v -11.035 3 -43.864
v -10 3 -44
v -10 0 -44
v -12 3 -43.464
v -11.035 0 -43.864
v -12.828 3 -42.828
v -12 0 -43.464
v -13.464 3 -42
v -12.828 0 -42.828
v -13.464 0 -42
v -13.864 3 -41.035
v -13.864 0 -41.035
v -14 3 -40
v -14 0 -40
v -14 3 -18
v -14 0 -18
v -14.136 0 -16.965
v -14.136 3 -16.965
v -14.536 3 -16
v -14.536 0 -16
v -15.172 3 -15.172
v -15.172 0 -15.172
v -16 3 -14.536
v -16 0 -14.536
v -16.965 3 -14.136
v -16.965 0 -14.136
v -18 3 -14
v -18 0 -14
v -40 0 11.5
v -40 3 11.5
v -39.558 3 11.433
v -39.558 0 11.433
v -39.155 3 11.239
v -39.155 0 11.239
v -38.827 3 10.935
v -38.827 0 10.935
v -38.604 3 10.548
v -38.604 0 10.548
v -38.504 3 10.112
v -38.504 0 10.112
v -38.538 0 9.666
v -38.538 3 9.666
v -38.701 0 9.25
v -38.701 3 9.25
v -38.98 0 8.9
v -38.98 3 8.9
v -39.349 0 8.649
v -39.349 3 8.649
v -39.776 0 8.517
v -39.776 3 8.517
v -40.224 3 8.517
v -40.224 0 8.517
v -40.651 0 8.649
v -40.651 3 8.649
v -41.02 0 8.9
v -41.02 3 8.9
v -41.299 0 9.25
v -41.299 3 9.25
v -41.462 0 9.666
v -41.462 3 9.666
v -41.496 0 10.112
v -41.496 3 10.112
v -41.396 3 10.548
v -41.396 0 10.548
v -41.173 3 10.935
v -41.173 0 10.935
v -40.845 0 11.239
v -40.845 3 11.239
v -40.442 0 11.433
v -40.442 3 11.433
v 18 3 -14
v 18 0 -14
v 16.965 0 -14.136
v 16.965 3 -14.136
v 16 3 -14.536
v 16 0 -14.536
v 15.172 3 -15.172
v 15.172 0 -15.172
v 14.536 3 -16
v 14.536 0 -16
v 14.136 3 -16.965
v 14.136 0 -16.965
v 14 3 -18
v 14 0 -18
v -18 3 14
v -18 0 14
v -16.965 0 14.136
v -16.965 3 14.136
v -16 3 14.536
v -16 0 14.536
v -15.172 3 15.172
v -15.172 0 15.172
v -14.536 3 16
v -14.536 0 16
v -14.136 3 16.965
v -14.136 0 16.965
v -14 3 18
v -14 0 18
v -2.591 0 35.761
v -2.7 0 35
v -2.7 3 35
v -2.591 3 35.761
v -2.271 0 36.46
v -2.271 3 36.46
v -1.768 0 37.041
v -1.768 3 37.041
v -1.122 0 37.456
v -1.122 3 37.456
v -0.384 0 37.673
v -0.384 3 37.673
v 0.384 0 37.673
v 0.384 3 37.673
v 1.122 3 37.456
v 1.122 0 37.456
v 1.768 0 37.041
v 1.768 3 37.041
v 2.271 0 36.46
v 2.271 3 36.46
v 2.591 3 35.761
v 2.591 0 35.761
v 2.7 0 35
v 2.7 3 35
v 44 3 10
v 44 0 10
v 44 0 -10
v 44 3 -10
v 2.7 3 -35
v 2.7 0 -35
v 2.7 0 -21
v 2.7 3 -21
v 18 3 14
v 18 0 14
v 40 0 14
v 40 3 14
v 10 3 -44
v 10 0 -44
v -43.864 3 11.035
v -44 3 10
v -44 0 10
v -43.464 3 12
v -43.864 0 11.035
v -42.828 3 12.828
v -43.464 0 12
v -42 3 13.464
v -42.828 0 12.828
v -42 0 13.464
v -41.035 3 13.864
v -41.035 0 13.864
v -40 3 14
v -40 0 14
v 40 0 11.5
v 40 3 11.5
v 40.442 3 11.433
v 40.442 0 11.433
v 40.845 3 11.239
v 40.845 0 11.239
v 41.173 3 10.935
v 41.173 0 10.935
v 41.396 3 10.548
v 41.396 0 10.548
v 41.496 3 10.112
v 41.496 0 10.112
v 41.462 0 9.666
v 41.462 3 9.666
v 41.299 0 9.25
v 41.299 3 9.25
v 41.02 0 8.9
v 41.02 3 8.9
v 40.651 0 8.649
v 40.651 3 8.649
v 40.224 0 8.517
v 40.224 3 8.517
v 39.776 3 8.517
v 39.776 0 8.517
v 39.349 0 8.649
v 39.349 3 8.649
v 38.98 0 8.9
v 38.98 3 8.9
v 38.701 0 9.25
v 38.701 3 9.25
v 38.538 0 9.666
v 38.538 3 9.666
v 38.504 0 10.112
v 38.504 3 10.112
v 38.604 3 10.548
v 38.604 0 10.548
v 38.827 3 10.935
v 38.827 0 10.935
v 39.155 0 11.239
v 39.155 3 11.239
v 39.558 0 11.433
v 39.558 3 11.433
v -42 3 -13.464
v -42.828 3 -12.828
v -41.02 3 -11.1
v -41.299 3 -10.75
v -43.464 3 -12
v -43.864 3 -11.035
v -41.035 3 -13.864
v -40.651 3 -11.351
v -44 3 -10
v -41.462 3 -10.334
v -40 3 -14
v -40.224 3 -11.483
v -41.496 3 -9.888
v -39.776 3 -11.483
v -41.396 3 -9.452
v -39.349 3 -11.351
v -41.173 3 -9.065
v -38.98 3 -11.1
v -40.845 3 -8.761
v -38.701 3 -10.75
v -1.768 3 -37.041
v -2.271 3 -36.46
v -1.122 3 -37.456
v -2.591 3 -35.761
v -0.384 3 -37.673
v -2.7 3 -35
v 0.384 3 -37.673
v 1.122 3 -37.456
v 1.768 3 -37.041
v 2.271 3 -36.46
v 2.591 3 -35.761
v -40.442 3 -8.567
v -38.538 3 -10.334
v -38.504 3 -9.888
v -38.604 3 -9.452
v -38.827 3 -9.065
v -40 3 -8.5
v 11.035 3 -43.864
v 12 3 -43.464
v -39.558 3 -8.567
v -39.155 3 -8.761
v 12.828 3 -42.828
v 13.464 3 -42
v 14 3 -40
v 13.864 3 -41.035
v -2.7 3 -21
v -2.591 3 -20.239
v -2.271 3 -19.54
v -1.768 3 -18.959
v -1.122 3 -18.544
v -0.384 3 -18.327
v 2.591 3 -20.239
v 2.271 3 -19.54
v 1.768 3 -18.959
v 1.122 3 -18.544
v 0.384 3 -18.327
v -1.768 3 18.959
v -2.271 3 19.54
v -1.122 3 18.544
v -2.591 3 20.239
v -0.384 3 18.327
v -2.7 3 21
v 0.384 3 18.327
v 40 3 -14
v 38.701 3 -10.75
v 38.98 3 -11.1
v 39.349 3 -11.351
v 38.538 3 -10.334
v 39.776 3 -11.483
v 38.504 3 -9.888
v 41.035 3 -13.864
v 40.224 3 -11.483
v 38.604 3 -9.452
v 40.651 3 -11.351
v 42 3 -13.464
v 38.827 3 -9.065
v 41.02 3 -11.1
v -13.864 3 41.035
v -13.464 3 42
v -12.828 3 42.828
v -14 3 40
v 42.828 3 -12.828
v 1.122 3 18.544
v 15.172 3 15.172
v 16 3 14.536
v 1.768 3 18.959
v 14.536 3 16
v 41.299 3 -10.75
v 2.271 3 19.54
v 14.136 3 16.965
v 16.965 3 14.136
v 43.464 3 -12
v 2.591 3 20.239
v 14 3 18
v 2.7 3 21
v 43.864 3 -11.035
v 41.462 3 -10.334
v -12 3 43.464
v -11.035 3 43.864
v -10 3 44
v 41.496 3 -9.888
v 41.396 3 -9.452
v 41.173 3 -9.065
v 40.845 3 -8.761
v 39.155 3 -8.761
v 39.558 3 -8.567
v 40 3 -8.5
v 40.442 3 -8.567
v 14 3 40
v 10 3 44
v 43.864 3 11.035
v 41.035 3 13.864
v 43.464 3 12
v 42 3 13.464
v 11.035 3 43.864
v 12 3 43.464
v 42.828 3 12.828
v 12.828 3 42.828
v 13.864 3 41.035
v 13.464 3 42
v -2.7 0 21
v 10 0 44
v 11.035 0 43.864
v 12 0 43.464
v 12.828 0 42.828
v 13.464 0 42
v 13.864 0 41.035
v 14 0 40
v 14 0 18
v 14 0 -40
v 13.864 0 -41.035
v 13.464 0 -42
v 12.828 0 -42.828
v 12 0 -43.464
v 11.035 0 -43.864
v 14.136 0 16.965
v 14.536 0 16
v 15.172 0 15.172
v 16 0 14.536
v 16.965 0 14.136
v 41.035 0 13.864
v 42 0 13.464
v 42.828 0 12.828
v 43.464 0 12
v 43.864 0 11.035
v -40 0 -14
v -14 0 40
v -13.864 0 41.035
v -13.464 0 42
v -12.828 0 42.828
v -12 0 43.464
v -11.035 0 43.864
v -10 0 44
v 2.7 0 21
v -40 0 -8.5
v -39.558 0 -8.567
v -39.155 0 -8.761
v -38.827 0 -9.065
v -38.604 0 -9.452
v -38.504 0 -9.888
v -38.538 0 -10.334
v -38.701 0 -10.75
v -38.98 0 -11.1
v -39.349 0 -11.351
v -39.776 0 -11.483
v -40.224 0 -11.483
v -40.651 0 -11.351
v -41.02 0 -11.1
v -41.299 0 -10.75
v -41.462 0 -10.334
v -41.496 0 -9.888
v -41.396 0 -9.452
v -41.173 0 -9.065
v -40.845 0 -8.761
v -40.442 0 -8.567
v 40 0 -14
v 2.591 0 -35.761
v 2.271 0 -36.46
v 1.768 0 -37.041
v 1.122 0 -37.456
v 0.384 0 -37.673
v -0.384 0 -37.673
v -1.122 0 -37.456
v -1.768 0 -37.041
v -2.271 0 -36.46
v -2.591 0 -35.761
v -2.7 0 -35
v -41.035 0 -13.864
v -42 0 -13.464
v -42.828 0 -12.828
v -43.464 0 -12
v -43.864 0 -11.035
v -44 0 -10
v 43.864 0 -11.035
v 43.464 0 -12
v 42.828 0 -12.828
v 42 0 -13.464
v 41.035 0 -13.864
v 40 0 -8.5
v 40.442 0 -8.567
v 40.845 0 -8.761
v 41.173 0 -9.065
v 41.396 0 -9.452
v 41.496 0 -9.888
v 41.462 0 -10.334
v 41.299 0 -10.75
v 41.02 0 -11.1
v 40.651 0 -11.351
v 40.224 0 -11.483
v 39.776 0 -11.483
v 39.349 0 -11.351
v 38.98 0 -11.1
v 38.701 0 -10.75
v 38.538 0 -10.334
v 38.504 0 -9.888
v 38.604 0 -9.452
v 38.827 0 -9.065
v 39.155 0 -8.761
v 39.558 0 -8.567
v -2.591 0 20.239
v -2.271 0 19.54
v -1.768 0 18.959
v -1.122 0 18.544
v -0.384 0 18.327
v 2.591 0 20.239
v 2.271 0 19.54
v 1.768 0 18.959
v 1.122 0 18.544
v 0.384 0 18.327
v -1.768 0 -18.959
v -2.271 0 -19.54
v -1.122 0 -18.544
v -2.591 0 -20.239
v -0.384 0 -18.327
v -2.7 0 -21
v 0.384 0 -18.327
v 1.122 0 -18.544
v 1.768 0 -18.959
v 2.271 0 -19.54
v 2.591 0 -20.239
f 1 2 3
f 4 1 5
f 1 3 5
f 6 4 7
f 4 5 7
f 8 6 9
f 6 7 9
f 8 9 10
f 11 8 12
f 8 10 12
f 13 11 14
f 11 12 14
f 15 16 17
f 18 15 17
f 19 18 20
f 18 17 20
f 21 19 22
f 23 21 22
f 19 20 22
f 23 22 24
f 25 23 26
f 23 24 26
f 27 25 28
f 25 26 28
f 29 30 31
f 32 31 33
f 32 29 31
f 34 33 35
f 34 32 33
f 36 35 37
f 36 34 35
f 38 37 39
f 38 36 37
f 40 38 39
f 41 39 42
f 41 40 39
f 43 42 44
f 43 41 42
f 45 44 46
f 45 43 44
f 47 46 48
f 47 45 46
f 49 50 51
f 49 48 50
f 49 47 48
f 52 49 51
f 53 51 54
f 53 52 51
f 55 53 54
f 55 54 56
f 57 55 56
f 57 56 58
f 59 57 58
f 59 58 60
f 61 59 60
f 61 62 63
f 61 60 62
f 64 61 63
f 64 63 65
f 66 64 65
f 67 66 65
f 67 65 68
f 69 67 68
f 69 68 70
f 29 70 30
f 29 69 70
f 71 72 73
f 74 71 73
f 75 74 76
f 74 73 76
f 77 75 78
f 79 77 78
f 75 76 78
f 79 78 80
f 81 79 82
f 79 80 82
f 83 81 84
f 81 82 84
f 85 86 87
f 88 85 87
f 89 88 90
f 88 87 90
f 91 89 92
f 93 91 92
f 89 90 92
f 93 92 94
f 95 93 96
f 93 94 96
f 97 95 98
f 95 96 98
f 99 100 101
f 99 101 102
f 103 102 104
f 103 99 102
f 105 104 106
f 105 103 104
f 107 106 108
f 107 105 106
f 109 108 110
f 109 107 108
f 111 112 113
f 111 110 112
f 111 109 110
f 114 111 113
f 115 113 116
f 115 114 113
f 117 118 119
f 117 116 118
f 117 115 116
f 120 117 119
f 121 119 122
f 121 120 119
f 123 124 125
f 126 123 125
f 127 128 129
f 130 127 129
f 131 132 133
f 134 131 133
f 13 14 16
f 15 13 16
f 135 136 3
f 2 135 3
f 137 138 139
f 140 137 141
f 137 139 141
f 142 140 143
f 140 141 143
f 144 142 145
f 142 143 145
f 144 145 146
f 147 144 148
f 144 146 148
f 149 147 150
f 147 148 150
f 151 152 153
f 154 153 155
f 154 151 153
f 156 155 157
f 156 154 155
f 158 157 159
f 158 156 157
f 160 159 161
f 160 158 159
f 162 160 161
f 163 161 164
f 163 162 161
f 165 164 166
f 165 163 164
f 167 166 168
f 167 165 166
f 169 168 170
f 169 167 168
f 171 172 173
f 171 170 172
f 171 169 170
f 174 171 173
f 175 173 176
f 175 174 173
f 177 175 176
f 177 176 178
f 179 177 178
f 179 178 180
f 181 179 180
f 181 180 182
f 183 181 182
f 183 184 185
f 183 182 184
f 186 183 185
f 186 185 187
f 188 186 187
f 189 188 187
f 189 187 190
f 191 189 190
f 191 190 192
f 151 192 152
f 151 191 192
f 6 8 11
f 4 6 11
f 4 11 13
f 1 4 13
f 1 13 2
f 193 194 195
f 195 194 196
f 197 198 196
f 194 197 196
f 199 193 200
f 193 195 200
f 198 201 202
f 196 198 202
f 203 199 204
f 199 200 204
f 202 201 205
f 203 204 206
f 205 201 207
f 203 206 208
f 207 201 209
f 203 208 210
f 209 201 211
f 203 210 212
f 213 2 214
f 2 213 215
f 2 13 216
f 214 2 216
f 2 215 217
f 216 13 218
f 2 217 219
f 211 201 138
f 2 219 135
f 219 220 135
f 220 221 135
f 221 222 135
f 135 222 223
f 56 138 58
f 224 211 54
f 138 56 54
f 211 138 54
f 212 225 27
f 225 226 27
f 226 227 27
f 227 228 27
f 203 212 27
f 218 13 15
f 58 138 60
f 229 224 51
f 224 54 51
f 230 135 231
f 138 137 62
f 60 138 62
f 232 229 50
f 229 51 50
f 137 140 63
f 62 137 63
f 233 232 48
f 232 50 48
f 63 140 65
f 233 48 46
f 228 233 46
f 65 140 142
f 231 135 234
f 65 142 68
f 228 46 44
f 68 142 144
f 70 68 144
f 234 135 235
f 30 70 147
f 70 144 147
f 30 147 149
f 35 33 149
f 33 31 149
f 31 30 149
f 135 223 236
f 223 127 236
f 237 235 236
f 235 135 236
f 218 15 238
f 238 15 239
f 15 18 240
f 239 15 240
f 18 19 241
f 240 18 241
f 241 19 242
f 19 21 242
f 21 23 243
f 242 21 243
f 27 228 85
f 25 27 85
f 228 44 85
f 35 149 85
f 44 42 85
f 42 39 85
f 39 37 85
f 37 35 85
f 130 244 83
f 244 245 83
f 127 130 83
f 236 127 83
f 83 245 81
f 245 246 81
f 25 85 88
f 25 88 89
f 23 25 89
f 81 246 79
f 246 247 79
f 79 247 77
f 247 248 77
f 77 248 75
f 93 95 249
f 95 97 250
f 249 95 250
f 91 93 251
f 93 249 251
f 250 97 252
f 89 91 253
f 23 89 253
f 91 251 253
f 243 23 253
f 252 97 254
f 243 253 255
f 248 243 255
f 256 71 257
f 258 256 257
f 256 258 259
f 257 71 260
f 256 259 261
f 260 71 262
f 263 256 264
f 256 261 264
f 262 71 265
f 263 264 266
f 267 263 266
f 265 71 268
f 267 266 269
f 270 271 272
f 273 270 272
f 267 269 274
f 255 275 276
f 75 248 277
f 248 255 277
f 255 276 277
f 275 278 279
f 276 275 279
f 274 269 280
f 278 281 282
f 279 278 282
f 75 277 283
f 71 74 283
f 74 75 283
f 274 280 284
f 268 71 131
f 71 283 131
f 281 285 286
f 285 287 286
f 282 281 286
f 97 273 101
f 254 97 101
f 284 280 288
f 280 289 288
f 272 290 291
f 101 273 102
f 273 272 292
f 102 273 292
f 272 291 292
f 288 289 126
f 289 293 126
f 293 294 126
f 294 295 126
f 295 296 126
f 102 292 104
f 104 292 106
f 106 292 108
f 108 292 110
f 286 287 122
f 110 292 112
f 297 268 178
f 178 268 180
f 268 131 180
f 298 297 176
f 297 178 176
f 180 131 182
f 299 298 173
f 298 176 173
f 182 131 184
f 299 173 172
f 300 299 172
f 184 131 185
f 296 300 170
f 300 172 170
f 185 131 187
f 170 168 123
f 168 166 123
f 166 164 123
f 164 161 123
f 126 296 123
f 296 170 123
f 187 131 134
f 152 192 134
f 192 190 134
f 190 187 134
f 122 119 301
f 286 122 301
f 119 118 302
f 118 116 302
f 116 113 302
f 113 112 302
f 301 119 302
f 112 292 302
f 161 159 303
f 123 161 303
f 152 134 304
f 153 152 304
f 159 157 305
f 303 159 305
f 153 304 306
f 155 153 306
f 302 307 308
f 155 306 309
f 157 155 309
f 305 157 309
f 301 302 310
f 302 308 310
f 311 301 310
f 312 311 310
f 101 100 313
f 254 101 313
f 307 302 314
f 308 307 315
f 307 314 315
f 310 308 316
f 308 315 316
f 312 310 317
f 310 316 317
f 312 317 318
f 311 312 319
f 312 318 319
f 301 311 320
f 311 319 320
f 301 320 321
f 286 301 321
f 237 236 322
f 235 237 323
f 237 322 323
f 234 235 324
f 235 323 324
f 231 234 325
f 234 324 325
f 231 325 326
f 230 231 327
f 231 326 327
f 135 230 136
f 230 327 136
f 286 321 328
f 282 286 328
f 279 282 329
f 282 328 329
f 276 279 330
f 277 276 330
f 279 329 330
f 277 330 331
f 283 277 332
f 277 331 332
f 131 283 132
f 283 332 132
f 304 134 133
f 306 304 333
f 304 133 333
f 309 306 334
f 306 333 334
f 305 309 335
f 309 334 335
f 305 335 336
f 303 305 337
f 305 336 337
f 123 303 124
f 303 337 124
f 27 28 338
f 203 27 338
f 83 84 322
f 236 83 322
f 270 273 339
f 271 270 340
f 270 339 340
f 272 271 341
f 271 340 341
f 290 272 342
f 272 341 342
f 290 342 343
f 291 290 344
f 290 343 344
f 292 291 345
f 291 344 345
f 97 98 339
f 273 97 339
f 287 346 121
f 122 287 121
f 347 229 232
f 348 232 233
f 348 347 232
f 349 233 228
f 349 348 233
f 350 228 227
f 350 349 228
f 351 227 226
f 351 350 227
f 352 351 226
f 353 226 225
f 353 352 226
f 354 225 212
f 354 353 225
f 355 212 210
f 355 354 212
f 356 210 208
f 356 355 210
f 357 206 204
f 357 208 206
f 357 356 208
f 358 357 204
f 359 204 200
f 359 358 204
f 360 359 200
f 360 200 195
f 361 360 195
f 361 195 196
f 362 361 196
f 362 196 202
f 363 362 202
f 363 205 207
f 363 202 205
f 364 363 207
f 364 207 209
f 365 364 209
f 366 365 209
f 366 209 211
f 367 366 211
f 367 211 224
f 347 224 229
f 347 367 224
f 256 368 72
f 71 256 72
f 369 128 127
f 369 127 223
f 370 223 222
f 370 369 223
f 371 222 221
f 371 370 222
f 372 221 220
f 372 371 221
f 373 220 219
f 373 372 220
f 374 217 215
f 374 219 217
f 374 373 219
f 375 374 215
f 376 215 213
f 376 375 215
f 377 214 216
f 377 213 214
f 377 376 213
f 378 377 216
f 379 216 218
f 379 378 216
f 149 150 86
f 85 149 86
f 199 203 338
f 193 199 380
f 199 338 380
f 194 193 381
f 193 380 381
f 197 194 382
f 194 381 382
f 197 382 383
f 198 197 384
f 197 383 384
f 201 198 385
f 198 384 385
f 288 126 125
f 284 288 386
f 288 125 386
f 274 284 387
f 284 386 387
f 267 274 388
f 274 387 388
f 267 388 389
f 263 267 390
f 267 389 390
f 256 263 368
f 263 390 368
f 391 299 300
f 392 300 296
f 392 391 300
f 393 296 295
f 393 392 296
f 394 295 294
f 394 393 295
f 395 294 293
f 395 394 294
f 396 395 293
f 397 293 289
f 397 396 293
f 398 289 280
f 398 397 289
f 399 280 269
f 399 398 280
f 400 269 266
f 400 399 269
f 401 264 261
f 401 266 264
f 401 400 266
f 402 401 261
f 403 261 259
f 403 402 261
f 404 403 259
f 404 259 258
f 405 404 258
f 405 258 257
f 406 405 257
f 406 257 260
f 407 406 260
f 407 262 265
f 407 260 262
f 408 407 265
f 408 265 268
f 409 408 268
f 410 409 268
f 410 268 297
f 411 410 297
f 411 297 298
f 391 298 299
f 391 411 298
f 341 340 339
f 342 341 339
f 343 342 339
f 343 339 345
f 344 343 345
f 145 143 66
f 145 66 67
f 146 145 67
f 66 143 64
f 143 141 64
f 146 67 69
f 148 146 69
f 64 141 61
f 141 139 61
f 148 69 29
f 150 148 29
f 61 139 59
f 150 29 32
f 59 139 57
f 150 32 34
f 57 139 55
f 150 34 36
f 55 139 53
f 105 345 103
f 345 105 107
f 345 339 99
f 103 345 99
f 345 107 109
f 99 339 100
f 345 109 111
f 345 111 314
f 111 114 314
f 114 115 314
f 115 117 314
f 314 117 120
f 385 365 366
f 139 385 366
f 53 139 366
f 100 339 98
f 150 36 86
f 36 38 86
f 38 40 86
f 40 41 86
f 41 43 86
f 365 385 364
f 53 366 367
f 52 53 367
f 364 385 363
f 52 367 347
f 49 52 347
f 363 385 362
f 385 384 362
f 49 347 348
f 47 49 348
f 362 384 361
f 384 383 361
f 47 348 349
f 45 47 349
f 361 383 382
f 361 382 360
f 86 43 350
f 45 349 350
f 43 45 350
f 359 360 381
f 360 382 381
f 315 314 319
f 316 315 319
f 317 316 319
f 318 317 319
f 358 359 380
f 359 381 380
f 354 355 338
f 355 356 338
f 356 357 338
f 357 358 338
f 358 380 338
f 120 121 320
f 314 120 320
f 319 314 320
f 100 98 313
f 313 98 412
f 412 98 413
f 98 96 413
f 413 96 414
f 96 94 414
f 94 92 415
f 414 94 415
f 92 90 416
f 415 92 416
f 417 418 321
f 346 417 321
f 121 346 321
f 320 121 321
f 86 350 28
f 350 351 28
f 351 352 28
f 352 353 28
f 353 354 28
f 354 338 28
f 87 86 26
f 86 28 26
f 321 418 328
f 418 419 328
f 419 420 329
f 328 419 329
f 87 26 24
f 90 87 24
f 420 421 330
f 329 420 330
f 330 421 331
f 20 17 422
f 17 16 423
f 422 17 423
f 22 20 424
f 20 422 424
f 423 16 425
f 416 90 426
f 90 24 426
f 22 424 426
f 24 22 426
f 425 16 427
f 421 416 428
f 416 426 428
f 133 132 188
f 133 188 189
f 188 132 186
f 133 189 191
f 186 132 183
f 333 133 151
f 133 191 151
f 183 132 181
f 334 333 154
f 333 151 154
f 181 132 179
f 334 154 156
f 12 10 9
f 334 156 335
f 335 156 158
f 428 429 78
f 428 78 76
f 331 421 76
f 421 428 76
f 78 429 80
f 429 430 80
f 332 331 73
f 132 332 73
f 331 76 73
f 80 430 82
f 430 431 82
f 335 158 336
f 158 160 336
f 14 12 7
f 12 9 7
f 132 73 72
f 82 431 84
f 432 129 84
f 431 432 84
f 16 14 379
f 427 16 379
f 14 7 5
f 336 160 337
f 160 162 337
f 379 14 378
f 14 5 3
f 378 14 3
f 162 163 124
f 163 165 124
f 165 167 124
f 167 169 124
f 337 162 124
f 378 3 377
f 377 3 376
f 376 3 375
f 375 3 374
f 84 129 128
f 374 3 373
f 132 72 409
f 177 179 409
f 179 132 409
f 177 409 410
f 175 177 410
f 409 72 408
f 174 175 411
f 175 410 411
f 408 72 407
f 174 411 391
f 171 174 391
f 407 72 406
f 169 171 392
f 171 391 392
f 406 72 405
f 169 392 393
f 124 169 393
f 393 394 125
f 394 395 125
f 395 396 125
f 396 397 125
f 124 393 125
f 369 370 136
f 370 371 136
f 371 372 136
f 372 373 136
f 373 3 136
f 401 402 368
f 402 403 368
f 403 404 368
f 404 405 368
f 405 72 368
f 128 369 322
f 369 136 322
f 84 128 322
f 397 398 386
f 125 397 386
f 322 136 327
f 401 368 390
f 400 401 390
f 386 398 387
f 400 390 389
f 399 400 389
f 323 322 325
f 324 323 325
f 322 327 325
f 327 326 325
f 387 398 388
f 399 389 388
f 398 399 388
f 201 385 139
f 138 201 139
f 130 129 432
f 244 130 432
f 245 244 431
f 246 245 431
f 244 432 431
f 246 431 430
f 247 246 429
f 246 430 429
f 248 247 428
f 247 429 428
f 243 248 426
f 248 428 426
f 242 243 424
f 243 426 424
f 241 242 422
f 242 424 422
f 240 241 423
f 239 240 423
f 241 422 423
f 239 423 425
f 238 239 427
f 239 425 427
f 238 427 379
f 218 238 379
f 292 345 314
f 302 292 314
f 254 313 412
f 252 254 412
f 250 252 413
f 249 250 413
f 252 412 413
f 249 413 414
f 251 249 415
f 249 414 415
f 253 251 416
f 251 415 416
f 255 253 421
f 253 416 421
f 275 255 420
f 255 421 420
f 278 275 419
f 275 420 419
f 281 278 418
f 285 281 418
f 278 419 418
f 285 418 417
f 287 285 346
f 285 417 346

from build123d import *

# Parameters (mm, degrees)
SKETCH_1_R          = 1.5
EXTRUDE_1_DEPTH     = 5
CUT_EXTRUDE_1_DEPTH = 10
SKETCH_3_W          = 97.68283175
SKETCH_3_H          = 2
CUT_EXTRUDE_2_DEPTH = 94


with BuildPart() as part:
    # 草图1 → 凸台-拉伸1 (new body)
    with BuildSketch(Plane(origin=(0, 0, 0), x_dir=(1, 0, 0), z_dir=(0, 1, 0))):
        with BuildLine():
            Line((14, -40), (14, -18))
            ThreePointArc((14, -18), (15.171572875, -15.171572875), (18, -14))
            Line((18, -14), (40, -14))
            ThreePointArc((40, -14), (42.828427125, -12.828427125), (44, -10))
            Line((44, -10), (44, 10))
            ThreePointArc((44, 10), (42.828427125, 12.828427125), (40, 14))
            Line((40, 14), (18, 14))
            ThreePointArc((18, 14), (15.171572875, 15.171572875), (14, 18))
            Line((14, 18), (14, 40))
            ThreePointArc((14, 40), (12.828427125, 42.828427125), (10, 44))
            Line((10, 44), (-10, 44))
            ThreePointArc((-10, 44), (-12.828427125, 42.828427125), (-14, 40))
            Line((-14, 40), (-14, 18))
            ThreePointArc((-14, 18), (-15.171572875, 15.171572875), (-18, 14))
            Line((-18, 14), (-40, 14))
            ThreePointArc((-40, 14), (-42.828427125, 12.828427125), (-44, 10))
            Line((-44, 10), (-44, -10))
            ThreePointArc((-44, -10), (-42.828427125, -12.828427125), (-40, -14))
            Line((-40, -14), (-18, -14))
            ThreePointArc((-18, -14), (-15.171572875, -15.171572875), (-14, -18))
            Line((-14, -18), (-14, -40))
            ThreePointArc((-14, -40), (-12.828427125, -42.828427125), (-10, -44))
            Line((-10, -44), (10, -44))
            ThreePointArc((10, -44), (12.828427125, -42.828427125), (14, -40))
        make_face()
        with Locations(Location((40, 10, 0), (0, 0, 270))):
            Circle(SKETCH_1_R, mode=Mode.SUBTRACT)
        with Locations(Location((40, -10, 0), (0, 0, 270))):
            Circle(SKETCH_1_R, mode=Mode.SUBTRACT)
        with Locations(Location((-40, 10, 0), (0, 0, 270))):
            Circle(SKETCH_1_R, mode=Mode.SUBTRACT)
        with Locations(Location((-40, -10, 0), (0, 0, 270))):
            Circle(SKETCH_1_R, mode=Mode.SUBTRACT)
        with BuildLine():
            ThreePointArc((-2.7, 30), (0, 27.3), (2.7, 30))
            Line((2.7, 30), (2.7, 35))
            ThreePointArc((2.7, 35), (0, 37.7), (-2.7, 35))
            Line((-2.7, 35), (-2.7, 30))
        make_face(mode=Mode.SUBTRACT)
        with BuildLine():
            ThreePointArc((2.7, -30), (0, -27.3), (-2.7, -30))
            Line((-2.7, -30), (-2.7, -35))
            ThreePointArc((-2.7, -35), (0, -37.7), (2.7, -35))
            Line((2.7, -35), (2.7, -30))
        make_face(mode=Mode.SUBTRACT)
    extrude(amount=EXTRUDE_1_DEPTH)

    # 草图2 → 切除-拉伸1 (cut)
    with BuildSketch(Plane.XZ):
        with BuildLine():
            Line((-2.7, -21), (-2.7, -30))
            ThreePointArc((-2.7, -30), (0, -27.3), (2.7, -30))
            Line((2.7, -30), (2.7, -21))
            ThreePointArc((2.7, -21), (0, -18.3), (-2.7, -21))
        make_face()
        with BuildLine():
            ThreePointArc((2.7, 30), (0, 27.3), (-2.7, 30))
            Line((-2.7, 30), (-2.7, 21))
            ThreePointArc((-2.7, 21), (0, 18.3), (2.7, 21))
            Line((2.7, 21), (2.7, 30))
        make_face()
        with BuildLine():
            ThreePointArc((-2.7, -30), (0, -27.3), (2.7, -30))
            Line((2.7, -30), (2.7, -35))
            ThreePointArc((2.7, -35), (0, -37.7), (-2.7, -35))
            Line((-2.7, -35), (-2.7, -30))
        make_face()
        with BuildLine():
            ThreePointArc((2.7, 30), (0, 27.3), (-2.7, 30))
            Line((-2.7, 30), (-2.7, 35))
            ThreePointArc((-2.7, 35), (0, 37.7), (2.7, 35))
            Line((2.7, 35), (2.7, 30))
        make_face()
    extrude(amount=-CUT_EXTRUDE_1_DEPTH, mode=Mode.SUBTRACT)

    # 草图3 → 切除-拉伸2 (cut)
    with BuildSketch(Plane.XY.offset(44)):
        with Locations((4.841415875, 4)):
            Rectangle(SKETCH_3_W, SKETCH_3_H)
    extrude(amount=-CUT_EXTRUDE_2_DEPTH, mode=Mode.SUBTRACT)


solid = part.part
